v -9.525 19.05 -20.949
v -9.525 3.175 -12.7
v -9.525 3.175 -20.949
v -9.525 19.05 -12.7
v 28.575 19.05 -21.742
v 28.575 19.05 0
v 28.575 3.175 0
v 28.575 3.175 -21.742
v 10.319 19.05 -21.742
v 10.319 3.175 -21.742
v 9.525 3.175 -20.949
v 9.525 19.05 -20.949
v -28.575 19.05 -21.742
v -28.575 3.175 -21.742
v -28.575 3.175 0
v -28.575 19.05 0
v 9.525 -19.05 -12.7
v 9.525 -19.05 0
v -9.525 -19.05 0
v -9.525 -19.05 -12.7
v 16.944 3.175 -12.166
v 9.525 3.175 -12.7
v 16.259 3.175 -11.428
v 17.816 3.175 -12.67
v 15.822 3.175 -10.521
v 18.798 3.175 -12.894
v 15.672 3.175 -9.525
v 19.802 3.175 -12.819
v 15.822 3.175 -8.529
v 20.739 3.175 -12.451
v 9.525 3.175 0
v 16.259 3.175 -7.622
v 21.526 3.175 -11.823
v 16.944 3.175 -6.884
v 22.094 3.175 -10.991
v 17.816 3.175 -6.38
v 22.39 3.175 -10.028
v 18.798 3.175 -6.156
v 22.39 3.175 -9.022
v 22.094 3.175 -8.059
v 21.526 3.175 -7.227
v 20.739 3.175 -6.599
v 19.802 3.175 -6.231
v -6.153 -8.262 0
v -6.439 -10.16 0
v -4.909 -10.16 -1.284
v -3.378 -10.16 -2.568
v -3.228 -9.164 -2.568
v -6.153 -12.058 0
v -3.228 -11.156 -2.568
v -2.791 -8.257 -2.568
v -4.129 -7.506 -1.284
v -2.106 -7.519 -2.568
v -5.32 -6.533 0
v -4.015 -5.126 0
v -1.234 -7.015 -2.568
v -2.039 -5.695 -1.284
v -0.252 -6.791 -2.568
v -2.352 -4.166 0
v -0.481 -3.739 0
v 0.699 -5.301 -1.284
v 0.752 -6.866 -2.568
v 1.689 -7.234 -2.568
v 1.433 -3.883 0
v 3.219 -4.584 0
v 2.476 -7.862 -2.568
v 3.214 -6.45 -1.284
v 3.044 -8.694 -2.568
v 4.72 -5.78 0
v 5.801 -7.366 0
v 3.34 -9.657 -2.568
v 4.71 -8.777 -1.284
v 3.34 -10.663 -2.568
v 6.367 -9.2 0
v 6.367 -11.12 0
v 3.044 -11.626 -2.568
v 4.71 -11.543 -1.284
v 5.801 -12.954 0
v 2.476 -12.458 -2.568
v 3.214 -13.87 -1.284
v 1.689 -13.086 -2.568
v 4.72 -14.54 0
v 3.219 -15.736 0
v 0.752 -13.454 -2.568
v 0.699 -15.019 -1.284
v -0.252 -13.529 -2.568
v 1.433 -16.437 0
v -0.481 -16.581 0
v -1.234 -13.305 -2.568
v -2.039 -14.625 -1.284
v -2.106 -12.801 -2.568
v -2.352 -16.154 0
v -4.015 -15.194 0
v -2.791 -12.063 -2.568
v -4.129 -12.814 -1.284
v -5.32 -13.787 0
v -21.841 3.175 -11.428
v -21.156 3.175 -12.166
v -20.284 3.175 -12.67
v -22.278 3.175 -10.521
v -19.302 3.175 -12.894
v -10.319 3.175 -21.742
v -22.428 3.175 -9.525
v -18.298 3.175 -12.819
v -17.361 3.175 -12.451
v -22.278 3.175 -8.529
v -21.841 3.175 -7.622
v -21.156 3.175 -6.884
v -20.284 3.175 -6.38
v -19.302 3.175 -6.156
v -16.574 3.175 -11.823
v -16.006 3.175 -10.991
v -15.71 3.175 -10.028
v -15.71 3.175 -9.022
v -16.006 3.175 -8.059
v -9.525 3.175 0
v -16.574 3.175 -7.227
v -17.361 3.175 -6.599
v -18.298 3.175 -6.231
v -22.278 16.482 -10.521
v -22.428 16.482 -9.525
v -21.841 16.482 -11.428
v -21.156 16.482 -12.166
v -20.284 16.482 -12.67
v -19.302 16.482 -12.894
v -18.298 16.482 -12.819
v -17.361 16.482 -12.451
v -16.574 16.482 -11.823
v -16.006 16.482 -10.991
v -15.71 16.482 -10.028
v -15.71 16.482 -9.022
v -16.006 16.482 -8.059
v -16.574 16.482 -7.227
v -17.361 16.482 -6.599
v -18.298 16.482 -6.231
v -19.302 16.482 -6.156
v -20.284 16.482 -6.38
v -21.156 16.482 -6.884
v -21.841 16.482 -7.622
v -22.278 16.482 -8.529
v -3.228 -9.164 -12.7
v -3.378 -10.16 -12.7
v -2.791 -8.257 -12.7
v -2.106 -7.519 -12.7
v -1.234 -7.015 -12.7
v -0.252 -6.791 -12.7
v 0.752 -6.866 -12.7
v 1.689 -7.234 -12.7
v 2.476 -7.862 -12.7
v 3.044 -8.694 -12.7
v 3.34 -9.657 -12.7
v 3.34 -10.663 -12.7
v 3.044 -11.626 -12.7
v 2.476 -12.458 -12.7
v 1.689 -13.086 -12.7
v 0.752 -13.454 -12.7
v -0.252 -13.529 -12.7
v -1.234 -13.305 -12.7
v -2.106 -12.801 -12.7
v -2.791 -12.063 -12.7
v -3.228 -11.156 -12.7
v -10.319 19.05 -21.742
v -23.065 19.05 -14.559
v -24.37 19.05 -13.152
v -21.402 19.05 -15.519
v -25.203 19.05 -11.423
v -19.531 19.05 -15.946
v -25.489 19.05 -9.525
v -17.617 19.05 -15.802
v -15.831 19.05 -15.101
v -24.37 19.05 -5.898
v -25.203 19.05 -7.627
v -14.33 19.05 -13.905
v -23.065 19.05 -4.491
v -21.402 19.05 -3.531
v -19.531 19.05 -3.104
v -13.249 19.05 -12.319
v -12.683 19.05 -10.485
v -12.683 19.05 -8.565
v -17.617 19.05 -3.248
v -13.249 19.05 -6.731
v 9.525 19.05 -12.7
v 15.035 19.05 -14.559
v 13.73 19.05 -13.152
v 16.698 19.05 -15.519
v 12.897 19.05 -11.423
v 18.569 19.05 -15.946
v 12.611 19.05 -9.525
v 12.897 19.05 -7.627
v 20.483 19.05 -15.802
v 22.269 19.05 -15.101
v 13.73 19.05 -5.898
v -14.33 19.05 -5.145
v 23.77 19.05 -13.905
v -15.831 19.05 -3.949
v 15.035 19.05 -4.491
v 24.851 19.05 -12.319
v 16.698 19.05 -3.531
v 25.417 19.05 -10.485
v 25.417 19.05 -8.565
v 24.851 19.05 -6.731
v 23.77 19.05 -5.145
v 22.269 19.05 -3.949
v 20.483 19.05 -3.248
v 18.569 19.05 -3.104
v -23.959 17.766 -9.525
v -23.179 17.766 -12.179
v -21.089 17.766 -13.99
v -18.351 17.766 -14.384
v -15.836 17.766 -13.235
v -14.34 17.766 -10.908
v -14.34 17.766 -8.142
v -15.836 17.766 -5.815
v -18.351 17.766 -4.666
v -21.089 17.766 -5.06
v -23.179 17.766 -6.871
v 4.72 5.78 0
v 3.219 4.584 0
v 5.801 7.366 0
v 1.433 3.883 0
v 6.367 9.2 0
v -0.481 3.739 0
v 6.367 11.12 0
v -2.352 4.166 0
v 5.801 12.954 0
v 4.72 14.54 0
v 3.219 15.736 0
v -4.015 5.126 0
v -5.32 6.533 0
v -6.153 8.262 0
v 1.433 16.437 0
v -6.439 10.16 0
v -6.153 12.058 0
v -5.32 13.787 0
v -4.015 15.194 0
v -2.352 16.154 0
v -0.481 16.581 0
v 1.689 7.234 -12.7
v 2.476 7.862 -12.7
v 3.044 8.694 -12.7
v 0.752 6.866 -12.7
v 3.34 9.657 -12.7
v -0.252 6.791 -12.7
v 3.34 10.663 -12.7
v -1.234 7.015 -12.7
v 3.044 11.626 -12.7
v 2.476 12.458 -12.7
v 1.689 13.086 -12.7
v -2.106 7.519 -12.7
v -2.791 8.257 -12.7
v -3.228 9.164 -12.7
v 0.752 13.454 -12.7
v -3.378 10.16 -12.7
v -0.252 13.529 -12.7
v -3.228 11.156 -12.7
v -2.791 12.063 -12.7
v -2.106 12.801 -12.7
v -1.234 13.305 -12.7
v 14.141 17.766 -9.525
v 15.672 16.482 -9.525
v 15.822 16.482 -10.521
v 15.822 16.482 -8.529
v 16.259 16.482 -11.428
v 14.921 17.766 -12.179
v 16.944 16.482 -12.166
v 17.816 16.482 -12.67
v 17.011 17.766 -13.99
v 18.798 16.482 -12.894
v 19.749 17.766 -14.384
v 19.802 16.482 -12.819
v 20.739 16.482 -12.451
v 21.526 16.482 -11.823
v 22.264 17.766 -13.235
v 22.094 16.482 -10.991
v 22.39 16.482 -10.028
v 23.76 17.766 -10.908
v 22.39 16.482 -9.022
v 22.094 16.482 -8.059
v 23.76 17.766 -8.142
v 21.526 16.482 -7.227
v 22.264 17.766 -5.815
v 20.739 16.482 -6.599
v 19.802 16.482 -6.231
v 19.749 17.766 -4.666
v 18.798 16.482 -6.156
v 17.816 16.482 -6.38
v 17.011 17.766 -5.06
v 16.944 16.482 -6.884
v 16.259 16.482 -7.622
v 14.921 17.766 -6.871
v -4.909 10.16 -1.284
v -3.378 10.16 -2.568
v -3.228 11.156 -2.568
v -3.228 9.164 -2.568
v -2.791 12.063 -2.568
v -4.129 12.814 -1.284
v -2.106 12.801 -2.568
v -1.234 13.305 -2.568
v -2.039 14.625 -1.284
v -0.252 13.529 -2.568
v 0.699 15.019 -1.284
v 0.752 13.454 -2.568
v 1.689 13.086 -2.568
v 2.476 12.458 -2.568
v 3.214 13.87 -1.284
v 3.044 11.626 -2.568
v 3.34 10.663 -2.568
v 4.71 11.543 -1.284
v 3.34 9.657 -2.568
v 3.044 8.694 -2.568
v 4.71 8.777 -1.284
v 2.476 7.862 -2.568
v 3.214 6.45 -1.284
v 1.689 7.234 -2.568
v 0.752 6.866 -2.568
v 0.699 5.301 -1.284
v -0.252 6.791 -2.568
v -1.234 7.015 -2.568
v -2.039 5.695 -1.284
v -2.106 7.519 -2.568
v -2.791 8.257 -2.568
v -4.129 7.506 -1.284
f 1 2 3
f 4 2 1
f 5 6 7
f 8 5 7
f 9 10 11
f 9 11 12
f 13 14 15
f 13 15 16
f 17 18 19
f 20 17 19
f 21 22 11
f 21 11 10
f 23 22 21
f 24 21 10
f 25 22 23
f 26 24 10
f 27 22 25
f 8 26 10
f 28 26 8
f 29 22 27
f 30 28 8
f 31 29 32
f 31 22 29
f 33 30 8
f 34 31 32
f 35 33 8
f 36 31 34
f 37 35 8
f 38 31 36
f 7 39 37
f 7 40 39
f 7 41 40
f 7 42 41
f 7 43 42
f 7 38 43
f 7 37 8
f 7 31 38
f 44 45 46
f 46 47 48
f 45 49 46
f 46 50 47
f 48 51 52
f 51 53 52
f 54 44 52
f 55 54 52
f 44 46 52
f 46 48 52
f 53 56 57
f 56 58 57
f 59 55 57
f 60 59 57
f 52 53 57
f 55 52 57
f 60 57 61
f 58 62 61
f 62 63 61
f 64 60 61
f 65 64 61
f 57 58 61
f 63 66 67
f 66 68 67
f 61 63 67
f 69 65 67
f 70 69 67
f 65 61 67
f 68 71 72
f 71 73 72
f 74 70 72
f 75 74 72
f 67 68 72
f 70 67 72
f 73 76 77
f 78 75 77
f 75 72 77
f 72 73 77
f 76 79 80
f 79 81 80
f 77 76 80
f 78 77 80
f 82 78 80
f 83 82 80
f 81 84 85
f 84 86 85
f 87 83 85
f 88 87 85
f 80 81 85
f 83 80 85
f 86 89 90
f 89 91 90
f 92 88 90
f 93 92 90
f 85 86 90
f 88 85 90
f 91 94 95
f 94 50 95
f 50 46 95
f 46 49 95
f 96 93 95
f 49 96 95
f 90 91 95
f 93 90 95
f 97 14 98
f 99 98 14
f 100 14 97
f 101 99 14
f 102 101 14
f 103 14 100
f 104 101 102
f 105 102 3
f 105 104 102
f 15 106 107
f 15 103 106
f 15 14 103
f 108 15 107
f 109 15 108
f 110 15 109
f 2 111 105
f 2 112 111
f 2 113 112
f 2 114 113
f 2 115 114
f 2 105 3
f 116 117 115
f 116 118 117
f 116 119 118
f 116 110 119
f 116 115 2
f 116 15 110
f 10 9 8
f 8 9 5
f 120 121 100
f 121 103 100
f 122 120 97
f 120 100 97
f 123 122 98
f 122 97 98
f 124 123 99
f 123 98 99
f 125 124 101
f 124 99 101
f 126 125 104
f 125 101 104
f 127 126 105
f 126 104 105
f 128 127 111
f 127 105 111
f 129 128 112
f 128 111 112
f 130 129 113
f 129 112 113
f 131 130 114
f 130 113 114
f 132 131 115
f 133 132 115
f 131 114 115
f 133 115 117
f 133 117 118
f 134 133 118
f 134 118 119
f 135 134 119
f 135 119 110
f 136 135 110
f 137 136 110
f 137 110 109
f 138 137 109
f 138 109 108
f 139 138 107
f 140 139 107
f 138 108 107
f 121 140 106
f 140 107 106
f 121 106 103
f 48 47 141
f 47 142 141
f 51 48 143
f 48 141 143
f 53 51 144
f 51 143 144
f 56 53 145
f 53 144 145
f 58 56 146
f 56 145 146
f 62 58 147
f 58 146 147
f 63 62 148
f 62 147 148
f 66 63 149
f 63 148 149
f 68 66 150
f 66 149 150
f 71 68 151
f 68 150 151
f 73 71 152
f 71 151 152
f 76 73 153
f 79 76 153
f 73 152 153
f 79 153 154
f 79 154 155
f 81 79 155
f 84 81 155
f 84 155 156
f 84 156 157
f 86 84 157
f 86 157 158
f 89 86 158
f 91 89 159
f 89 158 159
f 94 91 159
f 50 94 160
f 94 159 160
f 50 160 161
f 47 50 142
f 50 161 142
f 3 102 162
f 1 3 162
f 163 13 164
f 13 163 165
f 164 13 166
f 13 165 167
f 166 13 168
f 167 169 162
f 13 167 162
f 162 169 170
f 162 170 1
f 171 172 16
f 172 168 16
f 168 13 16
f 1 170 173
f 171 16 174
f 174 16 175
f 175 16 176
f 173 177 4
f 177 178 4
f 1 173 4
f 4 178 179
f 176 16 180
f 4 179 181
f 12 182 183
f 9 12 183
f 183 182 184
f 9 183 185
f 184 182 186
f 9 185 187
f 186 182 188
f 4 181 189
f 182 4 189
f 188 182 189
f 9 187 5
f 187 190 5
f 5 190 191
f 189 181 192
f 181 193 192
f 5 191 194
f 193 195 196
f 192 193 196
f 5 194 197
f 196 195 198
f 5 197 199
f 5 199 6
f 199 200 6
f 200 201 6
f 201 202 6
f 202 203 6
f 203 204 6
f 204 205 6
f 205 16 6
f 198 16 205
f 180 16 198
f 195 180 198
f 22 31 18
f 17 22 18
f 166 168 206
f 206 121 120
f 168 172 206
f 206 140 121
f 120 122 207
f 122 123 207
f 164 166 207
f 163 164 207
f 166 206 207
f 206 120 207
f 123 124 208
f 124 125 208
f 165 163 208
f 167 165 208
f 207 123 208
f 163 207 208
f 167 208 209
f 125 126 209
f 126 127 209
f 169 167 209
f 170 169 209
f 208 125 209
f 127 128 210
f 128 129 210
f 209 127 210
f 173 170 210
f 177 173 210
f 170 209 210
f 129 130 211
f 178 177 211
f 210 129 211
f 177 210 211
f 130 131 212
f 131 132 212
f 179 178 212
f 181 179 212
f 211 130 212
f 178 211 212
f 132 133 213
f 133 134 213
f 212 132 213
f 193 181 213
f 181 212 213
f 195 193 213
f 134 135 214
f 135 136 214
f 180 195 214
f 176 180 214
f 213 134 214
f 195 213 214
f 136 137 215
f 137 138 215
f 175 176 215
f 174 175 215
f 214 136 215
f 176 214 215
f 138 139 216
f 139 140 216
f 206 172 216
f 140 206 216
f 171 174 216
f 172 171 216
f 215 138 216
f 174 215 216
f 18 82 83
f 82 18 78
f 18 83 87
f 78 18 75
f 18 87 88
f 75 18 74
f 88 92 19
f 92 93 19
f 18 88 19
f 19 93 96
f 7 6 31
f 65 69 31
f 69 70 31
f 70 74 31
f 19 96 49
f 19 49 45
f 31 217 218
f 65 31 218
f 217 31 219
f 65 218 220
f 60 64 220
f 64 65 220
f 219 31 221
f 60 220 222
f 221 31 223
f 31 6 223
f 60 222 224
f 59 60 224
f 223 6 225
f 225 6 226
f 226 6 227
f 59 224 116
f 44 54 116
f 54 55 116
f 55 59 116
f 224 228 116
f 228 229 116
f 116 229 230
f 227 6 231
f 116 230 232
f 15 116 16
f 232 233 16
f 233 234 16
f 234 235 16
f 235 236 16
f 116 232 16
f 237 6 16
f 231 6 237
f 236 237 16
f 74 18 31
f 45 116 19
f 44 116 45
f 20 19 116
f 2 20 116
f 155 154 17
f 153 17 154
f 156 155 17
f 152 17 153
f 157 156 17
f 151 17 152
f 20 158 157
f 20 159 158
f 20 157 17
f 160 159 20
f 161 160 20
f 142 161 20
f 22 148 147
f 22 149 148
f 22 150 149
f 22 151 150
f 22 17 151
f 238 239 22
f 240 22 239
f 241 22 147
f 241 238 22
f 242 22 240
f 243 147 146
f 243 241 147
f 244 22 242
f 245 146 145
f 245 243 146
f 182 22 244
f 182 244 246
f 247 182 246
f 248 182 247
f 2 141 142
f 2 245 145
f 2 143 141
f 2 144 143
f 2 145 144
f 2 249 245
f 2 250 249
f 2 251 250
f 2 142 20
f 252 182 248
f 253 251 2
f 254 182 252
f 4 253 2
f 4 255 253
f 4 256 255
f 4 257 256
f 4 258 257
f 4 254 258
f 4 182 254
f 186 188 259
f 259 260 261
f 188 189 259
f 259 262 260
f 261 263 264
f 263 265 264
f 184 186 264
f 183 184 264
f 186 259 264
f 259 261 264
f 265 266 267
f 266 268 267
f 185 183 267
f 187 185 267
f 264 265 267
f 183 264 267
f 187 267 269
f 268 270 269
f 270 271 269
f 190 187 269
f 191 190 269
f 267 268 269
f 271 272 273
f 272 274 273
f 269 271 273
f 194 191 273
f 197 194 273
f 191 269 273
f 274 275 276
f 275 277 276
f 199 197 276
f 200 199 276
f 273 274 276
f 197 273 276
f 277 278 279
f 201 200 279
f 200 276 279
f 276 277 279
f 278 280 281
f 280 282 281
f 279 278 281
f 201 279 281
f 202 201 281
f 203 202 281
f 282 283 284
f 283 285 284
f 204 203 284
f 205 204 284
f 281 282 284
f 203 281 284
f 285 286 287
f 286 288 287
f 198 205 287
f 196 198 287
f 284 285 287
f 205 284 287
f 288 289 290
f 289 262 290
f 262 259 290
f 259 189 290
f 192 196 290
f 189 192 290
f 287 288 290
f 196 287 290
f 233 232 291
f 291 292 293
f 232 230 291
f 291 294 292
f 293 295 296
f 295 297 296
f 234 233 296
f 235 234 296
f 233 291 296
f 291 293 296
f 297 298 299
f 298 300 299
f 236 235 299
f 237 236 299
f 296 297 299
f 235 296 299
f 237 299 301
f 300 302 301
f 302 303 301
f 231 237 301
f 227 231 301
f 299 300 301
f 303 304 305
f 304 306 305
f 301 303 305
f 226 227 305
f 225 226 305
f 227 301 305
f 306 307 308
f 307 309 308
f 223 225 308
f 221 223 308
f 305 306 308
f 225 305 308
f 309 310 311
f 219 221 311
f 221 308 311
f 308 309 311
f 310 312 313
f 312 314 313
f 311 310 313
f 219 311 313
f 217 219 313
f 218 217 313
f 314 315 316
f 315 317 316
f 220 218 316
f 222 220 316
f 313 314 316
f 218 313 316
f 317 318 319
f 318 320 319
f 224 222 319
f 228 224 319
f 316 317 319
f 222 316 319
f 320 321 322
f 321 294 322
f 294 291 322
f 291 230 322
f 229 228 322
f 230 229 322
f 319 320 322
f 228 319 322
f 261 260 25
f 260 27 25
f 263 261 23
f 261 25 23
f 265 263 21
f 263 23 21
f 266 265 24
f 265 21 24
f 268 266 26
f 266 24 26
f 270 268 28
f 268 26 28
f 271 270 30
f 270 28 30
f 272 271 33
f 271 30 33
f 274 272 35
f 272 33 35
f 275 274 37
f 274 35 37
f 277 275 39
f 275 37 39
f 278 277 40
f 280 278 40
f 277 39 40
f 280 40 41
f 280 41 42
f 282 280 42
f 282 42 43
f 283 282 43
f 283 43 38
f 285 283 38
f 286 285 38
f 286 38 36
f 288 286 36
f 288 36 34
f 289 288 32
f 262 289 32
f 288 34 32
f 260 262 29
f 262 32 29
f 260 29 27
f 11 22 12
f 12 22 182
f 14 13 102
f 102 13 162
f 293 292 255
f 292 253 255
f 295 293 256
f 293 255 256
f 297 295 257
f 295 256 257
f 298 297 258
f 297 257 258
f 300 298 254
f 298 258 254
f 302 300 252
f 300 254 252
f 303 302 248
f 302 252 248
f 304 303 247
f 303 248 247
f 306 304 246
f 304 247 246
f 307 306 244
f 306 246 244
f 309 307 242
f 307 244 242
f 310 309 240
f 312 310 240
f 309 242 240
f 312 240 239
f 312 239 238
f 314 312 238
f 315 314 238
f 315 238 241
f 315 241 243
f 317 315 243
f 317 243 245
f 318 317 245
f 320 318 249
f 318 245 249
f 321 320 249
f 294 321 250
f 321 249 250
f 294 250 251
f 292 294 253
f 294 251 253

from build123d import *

# Parameters (mm, degrees)
BOSS_EXTRUDE1_DEPTH                                 = 12.7
CSK_FOR_1_4_FLAT_HEAD_MACHINE_SCREW_100_D           = 6.7564
CSK_FOR_1_4_FLAT_HEAD_MACHINE_SCREW_100_CSINK_D     = 12.8778
CSK_FOR_1_4_FLAT_HEAD_MACHINE_SCREW_100_CSINK_ANGLE = 100
SKETCH6_W                                           = 19.05
SKETCH6_H                                           = 15.875
BOSS_EXTRUDE2_DEPTH                                 = 9.0424
CSK_FOR_1_4_FLAT_HEAD_MACHINE_SCREW_2_D             = 6.7564
CSK_FOR_1_4_FLAT_HEAD_MACHINE_SCREW_2_CSINK_D       = 12.8778
CSK_FOR_1_4_FLAT_HEAD_MACHINE_SCREW_2_CSINK_ANGLE   = 100
CHAMFER1_SIZE                                       = 0.79375


with BuildPart() as part:
    # Sketch1 → Boss-Extrude1 (new body)
    with BuildSketch(Plane.XY):
        Polygon((-28.575, 19.05), (28.575, 19.05), (28.575, 3.175), (19.05, 3.175), (9.525, 3.175), (9.525, -19.05), (-9.525, -19.05), (-9.525, 3.175), (-19.05, 3.175), (-28.575, 3.175), align=None)
    extrude(amount=-BOSS_EXTRUDE1_DEPTH)

    # CSK for 1_4 Flat Head Machine Screw _100 (through all)
    with Locations(Plane.XY):
        with Locations((0, 10.16), (0, -10.16)):
            CounterSinkHole(CSK_FOR_1_4_FLAT_HEAD_MACHINE_SCREW_100_D / 2, CSK_FOR_1_4_FLAT_HEAD_MACHINE_SCREW_100_CSINK_D / 2, counter_sink_angle=CSK_FOR_1_4_FLAT_HEAD_MACHINE_SCREW_100_CSINK_ANGLE)

    # Sketch6 → Boss-Extrude2 (add)
    with BuildSketch(Plane.XY.offset(-12.7)):
        with Locations((-19.05, 11.1125)):
            Rectangle(SKETCH6_W, SKETCH6_H)
        with Locations((19.05, 11.1125)):
            Rectangle(SKETCH6_W, SKETCH6_H)
    extrude(amount=-BOSS_EXTRUDE2_DEPTH)

    # CSK for 1_4 Flat Head Machine Screw  2 (through all)
    with Locations(Plane(origin=(0, 19.05, 0), x_dir=(1, 0, 0), z_dir=(0, 1, 0))):
        with Locations((-19.05, 9.525), (19.05, 9.525)):
            CounterSinkHole(CSK_FOR_1_4_FLAT_HEAD_MACHINE_SCREW_2_D / 2, CSK_FOR_1_4_FLAT_HEAD_MACHINE_SCREW_2_CSINK_D / 2, counter_sink_angle=CSK_FOR_1_4_FLAT_HEAD_MACHINE_SCREW_2_CSINK_ANGLE)

    # Chamfer1
    chamfer1_edges = [part.edges().sort_by_distance(p)[0] for p in [
        (-9.525, 11.1125, -21.7424),
        (9.525, 11.1125, -21.7424),
    ]]
    chamfer(chamfer1_edges, length=CHAMFER1_SIZE)


solid = part.part
